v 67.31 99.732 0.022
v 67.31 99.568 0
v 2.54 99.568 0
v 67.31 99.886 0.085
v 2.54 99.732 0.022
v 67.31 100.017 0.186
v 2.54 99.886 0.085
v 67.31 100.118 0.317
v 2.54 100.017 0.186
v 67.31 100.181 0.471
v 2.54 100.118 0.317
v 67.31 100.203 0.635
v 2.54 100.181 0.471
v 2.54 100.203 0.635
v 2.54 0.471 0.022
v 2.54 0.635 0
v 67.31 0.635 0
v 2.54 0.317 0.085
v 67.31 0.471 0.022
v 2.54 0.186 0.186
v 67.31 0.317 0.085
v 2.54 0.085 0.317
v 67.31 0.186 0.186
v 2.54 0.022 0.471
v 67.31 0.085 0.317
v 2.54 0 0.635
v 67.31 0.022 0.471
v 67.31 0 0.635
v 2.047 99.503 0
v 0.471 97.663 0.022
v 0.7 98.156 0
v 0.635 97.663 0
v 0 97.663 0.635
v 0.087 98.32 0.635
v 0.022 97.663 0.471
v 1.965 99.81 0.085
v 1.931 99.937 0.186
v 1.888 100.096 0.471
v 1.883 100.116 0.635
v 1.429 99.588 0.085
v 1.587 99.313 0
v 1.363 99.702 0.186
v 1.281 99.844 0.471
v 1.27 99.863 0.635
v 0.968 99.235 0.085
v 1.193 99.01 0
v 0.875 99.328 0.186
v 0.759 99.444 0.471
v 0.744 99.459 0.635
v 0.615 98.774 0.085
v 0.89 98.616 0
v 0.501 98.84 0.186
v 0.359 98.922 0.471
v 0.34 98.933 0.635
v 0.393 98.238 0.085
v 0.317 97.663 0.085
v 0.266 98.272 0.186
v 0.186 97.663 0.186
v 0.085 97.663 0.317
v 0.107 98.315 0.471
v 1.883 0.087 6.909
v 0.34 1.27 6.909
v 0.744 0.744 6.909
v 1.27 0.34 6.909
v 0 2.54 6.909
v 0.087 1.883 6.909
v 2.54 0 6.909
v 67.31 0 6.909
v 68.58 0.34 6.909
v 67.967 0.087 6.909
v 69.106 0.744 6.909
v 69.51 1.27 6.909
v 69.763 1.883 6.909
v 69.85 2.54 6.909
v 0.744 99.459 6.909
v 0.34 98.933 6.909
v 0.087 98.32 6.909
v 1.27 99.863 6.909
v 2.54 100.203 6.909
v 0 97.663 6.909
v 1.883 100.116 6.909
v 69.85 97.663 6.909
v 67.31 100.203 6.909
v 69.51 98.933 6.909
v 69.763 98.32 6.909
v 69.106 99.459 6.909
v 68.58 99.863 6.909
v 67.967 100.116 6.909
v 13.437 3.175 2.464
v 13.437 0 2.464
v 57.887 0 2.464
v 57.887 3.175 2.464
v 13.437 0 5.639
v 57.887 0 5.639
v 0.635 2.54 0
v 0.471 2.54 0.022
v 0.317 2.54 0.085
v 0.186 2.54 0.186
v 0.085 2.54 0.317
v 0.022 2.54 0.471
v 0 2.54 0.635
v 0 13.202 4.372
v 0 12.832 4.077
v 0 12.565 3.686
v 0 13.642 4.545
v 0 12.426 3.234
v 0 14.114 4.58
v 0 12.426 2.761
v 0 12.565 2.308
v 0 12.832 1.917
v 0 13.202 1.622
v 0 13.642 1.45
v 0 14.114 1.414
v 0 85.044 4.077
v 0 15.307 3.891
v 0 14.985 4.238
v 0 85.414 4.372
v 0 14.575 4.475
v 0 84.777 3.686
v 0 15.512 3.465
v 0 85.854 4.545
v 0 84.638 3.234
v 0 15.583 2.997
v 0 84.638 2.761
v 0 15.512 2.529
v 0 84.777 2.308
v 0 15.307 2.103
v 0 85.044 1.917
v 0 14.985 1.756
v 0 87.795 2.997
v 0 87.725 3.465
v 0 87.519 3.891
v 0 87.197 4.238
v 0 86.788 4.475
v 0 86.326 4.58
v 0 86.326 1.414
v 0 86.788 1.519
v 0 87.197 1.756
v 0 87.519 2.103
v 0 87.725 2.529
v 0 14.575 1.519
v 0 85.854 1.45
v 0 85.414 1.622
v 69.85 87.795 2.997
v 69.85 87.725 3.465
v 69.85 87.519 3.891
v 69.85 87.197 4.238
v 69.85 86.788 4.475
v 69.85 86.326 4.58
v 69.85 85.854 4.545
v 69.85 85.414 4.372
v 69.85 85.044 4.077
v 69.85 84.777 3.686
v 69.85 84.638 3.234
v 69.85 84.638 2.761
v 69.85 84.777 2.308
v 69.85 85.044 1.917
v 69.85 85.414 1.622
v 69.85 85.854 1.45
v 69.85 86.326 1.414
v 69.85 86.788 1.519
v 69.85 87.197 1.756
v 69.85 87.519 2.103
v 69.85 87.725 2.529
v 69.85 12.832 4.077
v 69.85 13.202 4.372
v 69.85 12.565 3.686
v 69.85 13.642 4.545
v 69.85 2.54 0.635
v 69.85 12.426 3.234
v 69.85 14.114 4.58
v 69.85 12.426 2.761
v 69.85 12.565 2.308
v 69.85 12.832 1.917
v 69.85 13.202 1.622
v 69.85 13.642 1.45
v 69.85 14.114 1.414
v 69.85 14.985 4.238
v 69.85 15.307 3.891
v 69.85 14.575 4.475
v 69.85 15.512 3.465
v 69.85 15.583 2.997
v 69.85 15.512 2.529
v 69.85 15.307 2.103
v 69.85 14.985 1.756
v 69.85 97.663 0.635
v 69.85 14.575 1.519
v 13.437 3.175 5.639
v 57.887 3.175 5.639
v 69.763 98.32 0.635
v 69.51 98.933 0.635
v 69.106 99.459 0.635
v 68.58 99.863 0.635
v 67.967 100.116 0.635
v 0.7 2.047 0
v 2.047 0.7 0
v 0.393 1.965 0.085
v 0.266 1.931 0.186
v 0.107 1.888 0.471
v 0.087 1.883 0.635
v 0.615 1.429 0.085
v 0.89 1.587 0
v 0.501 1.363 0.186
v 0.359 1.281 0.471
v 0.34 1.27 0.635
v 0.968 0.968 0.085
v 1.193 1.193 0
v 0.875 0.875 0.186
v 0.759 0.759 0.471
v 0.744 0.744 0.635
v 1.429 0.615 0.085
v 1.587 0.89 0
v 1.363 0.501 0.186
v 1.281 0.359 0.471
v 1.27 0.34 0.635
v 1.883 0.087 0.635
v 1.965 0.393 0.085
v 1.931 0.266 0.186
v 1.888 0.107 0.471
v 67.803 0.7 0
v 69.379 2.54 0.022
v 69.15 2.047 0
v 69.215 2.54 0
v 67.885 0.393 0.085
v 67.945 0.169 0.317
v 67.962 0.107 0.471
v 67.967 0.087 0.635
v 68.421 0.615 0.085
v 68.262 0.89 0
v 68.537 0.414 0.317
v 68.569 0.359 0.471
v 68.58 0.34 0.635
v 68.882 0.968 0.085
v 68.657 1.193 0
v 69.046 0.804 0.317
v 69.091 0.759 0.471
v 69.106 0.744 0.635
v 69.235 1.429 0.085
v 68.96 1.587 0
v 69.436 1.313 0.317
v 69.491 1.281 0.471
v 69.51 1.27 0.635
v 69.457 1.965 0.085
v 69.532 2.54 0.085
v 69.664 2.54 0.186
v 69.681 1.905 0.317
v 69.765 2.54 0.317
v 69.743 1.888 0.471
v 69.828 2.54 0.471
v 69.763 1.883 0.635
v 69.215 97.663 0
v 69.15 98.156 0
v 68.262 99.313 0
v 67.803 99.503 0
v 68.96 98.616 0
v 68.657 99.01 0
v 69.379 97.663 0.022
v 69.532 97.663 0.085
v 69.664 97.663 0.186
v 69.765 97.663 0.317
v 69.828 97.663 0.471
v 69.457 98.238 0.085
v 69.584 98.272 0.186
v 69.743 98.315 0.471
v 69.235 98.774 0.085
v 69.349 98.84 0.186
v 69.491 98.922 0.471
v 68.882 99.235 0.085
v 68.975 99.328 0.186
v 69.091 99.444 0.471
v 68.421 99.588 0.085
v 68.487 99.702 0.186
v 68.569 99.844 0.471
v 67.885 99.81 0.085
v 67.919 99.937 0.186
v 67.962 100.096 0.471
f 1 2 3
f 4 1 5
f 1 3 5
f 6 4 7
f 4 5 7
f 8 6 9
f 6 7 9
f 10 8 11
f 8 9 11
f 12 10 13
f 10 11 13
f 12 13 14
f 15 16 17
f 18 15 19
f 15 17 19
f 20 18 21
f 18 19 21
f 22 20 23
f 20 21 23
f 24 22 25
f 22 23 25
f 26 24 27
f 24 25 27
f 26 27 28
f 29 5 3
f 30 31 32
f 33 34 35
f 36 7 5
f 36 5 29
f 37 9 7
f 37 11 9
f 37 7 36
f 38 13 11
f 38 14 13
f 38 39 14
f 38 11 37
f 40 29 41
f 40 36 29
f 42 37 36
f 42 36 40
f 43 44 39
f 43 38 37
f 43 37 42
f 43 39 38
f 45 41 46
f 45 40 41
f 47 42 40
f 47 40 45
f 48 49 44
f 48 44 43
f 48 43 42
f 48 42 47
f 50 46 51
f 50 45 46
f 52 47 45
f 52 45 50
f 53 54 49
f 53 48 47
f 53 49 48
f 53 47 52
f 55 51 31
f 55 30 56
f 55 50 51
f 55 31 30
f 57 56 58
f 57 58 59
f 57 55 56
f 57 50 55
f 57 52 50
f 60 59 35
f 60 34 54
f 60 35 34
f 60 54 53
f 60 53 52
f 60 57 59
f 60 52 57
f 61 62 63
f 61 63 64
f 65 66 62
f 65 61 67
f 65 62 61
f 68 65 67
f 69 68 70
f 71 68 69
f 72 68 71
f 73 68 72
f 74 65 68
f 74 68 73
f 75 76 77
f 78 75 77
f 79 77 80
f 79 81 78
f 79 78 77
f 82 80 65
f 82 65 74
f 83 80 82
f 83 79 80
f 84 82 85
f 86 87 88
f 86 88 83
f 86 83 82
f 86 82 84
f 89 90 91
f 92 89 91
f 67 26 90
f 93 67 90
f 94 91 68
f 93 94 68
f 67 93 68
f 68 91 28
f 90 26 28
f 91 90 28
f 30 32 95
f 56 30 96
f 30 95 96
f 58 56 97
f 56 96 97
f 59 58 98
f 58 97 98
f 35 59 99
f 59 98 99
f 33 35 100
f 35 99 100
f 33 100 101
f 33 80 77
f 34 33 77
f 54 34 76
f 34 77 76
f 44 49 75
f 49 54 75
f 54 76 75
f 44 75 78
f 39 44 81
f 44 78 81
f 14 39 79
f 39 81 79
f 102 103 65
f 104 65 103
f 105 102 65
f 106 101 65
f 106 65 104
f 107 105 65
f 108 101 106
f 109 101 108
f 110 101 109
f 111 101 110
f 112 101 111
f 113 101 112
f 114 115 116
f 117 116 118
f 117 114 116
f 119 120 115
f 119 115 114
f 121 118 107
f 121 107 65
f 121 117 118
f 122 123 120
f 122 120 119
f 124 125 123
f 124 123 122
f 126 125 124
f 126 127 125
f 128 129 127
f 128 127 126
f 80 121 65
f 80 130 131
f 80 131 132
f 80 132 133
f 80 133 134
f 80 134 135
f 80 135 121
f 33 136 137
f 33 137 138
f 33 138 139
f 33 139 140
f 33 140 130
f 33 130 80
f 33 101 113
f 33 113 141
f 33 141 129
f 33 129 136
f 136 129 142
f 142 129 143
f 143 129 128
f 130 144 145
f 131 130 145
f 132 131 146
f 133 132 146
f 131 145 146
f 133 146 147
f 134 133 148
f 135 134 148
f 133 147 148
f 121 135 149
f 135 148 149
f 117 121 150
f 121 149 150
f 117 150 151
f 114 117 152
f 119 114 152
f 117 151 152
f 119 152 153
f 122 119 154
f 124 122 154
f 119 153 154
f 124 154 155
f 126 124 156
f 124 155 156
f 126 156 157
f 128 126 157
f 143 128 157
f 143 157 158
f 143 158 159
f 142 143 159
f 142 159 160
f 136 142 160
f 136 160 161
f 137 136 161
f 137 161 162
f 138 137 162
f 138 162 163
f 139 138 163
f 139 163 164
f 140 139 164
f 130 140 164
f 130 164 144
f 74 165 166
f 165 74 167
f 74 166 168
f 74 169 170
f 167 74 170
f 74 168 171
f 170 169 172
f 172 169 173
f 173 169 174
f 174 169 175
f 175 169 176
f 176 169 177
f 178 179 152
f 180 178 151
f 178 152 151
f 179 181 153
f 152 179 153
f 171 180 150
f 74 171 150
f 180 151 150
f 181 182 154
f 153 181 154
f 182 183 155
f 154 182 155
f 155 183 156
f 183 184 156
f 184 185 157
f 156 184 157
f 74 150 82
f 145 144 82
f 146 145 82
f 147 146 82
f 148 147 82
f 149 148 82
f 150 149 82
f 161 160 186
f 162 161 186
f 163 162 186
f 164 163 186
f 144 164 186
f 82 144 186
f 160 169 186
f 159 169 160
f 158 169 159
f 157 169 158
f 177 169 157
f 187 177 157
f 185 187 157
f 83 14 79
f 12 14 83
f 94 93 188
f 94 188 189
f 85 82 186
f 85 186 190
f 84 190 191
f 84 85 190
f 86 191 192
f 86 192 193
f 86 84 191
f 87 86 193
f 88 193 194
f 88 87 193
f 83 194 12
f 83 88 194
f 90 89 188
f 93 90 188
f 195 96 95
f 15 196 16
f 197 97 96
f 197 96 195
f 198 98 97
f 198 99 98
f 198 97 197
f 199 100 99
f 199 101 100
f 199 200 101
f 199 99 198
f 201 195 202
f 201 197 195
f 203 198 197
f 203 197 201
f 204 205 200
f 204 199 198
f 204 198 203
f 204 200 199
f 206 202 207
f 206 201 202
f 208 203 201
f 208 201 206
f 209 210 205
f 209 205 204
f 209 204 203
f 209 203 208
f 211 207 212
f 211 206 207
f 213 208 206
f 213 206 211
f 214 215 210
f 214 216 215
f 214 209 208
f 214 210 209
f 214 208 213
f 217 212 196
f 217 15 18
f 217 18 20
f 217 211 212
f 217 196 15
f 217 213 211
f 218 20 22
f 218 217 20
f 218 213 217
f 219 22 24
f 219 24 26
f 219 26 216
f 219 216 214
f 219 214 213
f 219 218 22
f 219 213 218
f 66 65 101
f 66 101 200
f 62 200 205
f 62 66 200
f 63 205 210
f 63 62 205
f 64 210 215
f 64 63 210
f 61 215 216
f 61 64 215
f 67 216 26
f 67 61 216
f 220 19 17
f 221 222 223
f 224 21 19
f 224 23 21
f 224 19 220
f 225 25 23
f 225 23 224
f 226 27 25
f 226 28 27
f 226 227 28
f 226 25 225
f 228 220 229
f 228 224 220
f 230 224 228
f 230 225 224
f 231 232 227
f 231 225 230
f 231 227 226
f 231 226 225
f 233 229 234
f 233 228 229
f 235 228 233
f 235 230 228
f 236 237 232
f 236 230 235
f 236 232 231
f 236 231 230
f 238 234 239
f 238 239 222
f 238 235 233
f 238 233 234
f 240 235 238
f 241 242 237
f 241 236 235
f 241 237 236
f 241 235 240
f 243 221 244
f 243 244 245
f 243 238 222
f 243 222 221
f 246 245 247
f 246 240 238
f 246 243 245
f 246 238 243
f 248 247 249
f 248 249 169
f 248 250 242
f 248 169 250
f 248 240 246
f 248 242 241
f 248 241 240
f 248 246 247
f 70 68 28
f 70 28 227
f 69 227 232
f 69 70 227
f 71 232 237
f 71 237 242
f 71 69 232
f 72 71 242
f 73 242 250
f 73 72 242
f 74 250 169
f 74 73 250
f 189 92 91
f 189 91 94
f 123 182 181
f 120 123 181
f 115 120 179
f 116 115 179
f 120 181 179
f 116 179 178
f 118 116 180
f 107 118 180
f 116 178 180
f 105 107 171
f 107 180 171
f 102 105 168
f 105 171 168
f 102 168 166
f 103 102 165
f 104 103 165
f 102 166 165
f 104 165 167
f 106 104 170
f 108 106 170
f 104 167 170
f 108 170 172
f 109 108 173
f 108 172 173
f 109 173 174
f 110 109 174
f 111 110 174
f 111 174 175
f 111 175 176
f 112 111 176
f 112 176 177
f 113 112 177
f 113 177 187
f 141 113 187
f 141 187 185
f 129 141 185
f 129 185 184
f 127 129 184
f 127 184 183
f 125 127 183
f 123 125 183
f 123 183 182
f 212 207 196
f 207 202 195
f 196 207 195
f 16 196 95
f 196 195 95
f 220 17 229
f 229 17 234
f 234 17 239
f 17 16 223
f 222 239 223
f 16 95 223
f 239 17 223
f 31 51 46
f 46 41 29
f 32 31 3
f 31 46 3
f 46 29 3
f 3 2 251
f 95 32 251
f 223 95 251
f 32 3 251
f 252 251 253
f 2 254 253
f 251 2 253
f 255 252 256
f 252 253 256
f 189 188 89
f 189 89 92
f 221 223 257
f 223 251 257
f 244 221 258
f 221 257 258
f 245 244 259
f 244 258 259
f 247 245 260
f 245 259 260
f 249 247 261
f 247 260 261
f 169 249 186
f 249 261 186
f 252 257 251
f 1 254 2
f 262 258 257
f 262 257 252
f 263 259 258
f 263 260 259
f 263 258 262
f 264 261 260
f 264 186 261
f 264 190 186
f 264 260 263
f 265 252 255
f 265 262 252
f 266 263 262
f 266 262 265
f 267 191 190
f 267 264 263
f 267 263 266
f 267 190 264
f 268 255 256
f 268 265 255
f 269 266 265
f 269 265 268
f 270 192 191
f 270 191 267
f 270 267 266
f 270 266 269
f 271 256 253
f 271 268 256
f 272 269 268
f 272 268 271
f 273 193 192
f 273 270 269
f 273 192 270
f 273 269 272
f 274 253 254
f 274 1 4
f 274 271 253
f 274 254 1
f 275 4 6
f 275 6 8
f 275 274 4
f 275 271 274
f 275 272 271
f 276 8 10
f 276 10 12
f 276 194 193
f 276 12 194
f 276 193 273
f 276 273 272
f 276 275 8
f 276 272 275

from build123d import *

# Parameters (mm, degrees)
F0_W     = 69.85
F0_H     = 100.203
F1_DEPTH = 6.9088
F2_R     = 2.54
F3_R     = 1.5875
F4_DEPTH = 69.851
F5_R     = 0.635
F6_W     = 44.45
F6_H     = 3.175
F7_DEPTH = 3.175


with BuildPart() as f1:
    # F0 (on Top) → F1 (new body)
    with BuildSketch(Plane.XY):
        with Locations((34.925, 50.1015)):
            Rectangle(F0_W, F0_H)
    extrude(amount=F1_DEPTH)

    # F2
    f2_edges = [f1.edges().sort_by_distance(p)[0] for p in [
        (69.85, 0, 3.4544),
        (0, 0, 3.4544),
        (69.85, 100.203, 3.4544),
        (0, 100.203, 3.4544),
    ]]
    fillet(f2_edges, radius=F2_R)

    # F3 (on face) → F4 (cut, through all)
    with BuildSketch(Plane.YZ.offset(69.85)):
        with Locations((13.9954, 2.9972)):
            Circle(F3_R)
        with Locations((86.2076, 2.9972)):
            Circle(F3_R)
    extrude(amount=-F4_DEPTH, mode=Mode.SUBTRACT)

    # F5
    f5_edges = [f1.edges().sort_by_distance(p)[0] for p in [
        (69.85, 50.1015, 0),
        (69.106051, 0.743949, 0),
        (34.925, 0, 0),
        (0.743949, 0.743949, 0),
        (0, 50.1015, 0),
        (0.743949, 99.459051, 0),
        (34.925, 100.203, 0),
        (69.106051, 99.459051, 0),
    ]]
    fillet(f5_edges, radius=F5_R)

    # F6 (on face) → F7 (cut)
    with BuildSketch(Plane.XZ):
        with Locations((35.6616, 4.0513)):
            Rectangle(F6_W, F6_H)
    extrude(amount=-F7_DEPTH, mode=Mode.SUBTRACT)


solid = f1.part
